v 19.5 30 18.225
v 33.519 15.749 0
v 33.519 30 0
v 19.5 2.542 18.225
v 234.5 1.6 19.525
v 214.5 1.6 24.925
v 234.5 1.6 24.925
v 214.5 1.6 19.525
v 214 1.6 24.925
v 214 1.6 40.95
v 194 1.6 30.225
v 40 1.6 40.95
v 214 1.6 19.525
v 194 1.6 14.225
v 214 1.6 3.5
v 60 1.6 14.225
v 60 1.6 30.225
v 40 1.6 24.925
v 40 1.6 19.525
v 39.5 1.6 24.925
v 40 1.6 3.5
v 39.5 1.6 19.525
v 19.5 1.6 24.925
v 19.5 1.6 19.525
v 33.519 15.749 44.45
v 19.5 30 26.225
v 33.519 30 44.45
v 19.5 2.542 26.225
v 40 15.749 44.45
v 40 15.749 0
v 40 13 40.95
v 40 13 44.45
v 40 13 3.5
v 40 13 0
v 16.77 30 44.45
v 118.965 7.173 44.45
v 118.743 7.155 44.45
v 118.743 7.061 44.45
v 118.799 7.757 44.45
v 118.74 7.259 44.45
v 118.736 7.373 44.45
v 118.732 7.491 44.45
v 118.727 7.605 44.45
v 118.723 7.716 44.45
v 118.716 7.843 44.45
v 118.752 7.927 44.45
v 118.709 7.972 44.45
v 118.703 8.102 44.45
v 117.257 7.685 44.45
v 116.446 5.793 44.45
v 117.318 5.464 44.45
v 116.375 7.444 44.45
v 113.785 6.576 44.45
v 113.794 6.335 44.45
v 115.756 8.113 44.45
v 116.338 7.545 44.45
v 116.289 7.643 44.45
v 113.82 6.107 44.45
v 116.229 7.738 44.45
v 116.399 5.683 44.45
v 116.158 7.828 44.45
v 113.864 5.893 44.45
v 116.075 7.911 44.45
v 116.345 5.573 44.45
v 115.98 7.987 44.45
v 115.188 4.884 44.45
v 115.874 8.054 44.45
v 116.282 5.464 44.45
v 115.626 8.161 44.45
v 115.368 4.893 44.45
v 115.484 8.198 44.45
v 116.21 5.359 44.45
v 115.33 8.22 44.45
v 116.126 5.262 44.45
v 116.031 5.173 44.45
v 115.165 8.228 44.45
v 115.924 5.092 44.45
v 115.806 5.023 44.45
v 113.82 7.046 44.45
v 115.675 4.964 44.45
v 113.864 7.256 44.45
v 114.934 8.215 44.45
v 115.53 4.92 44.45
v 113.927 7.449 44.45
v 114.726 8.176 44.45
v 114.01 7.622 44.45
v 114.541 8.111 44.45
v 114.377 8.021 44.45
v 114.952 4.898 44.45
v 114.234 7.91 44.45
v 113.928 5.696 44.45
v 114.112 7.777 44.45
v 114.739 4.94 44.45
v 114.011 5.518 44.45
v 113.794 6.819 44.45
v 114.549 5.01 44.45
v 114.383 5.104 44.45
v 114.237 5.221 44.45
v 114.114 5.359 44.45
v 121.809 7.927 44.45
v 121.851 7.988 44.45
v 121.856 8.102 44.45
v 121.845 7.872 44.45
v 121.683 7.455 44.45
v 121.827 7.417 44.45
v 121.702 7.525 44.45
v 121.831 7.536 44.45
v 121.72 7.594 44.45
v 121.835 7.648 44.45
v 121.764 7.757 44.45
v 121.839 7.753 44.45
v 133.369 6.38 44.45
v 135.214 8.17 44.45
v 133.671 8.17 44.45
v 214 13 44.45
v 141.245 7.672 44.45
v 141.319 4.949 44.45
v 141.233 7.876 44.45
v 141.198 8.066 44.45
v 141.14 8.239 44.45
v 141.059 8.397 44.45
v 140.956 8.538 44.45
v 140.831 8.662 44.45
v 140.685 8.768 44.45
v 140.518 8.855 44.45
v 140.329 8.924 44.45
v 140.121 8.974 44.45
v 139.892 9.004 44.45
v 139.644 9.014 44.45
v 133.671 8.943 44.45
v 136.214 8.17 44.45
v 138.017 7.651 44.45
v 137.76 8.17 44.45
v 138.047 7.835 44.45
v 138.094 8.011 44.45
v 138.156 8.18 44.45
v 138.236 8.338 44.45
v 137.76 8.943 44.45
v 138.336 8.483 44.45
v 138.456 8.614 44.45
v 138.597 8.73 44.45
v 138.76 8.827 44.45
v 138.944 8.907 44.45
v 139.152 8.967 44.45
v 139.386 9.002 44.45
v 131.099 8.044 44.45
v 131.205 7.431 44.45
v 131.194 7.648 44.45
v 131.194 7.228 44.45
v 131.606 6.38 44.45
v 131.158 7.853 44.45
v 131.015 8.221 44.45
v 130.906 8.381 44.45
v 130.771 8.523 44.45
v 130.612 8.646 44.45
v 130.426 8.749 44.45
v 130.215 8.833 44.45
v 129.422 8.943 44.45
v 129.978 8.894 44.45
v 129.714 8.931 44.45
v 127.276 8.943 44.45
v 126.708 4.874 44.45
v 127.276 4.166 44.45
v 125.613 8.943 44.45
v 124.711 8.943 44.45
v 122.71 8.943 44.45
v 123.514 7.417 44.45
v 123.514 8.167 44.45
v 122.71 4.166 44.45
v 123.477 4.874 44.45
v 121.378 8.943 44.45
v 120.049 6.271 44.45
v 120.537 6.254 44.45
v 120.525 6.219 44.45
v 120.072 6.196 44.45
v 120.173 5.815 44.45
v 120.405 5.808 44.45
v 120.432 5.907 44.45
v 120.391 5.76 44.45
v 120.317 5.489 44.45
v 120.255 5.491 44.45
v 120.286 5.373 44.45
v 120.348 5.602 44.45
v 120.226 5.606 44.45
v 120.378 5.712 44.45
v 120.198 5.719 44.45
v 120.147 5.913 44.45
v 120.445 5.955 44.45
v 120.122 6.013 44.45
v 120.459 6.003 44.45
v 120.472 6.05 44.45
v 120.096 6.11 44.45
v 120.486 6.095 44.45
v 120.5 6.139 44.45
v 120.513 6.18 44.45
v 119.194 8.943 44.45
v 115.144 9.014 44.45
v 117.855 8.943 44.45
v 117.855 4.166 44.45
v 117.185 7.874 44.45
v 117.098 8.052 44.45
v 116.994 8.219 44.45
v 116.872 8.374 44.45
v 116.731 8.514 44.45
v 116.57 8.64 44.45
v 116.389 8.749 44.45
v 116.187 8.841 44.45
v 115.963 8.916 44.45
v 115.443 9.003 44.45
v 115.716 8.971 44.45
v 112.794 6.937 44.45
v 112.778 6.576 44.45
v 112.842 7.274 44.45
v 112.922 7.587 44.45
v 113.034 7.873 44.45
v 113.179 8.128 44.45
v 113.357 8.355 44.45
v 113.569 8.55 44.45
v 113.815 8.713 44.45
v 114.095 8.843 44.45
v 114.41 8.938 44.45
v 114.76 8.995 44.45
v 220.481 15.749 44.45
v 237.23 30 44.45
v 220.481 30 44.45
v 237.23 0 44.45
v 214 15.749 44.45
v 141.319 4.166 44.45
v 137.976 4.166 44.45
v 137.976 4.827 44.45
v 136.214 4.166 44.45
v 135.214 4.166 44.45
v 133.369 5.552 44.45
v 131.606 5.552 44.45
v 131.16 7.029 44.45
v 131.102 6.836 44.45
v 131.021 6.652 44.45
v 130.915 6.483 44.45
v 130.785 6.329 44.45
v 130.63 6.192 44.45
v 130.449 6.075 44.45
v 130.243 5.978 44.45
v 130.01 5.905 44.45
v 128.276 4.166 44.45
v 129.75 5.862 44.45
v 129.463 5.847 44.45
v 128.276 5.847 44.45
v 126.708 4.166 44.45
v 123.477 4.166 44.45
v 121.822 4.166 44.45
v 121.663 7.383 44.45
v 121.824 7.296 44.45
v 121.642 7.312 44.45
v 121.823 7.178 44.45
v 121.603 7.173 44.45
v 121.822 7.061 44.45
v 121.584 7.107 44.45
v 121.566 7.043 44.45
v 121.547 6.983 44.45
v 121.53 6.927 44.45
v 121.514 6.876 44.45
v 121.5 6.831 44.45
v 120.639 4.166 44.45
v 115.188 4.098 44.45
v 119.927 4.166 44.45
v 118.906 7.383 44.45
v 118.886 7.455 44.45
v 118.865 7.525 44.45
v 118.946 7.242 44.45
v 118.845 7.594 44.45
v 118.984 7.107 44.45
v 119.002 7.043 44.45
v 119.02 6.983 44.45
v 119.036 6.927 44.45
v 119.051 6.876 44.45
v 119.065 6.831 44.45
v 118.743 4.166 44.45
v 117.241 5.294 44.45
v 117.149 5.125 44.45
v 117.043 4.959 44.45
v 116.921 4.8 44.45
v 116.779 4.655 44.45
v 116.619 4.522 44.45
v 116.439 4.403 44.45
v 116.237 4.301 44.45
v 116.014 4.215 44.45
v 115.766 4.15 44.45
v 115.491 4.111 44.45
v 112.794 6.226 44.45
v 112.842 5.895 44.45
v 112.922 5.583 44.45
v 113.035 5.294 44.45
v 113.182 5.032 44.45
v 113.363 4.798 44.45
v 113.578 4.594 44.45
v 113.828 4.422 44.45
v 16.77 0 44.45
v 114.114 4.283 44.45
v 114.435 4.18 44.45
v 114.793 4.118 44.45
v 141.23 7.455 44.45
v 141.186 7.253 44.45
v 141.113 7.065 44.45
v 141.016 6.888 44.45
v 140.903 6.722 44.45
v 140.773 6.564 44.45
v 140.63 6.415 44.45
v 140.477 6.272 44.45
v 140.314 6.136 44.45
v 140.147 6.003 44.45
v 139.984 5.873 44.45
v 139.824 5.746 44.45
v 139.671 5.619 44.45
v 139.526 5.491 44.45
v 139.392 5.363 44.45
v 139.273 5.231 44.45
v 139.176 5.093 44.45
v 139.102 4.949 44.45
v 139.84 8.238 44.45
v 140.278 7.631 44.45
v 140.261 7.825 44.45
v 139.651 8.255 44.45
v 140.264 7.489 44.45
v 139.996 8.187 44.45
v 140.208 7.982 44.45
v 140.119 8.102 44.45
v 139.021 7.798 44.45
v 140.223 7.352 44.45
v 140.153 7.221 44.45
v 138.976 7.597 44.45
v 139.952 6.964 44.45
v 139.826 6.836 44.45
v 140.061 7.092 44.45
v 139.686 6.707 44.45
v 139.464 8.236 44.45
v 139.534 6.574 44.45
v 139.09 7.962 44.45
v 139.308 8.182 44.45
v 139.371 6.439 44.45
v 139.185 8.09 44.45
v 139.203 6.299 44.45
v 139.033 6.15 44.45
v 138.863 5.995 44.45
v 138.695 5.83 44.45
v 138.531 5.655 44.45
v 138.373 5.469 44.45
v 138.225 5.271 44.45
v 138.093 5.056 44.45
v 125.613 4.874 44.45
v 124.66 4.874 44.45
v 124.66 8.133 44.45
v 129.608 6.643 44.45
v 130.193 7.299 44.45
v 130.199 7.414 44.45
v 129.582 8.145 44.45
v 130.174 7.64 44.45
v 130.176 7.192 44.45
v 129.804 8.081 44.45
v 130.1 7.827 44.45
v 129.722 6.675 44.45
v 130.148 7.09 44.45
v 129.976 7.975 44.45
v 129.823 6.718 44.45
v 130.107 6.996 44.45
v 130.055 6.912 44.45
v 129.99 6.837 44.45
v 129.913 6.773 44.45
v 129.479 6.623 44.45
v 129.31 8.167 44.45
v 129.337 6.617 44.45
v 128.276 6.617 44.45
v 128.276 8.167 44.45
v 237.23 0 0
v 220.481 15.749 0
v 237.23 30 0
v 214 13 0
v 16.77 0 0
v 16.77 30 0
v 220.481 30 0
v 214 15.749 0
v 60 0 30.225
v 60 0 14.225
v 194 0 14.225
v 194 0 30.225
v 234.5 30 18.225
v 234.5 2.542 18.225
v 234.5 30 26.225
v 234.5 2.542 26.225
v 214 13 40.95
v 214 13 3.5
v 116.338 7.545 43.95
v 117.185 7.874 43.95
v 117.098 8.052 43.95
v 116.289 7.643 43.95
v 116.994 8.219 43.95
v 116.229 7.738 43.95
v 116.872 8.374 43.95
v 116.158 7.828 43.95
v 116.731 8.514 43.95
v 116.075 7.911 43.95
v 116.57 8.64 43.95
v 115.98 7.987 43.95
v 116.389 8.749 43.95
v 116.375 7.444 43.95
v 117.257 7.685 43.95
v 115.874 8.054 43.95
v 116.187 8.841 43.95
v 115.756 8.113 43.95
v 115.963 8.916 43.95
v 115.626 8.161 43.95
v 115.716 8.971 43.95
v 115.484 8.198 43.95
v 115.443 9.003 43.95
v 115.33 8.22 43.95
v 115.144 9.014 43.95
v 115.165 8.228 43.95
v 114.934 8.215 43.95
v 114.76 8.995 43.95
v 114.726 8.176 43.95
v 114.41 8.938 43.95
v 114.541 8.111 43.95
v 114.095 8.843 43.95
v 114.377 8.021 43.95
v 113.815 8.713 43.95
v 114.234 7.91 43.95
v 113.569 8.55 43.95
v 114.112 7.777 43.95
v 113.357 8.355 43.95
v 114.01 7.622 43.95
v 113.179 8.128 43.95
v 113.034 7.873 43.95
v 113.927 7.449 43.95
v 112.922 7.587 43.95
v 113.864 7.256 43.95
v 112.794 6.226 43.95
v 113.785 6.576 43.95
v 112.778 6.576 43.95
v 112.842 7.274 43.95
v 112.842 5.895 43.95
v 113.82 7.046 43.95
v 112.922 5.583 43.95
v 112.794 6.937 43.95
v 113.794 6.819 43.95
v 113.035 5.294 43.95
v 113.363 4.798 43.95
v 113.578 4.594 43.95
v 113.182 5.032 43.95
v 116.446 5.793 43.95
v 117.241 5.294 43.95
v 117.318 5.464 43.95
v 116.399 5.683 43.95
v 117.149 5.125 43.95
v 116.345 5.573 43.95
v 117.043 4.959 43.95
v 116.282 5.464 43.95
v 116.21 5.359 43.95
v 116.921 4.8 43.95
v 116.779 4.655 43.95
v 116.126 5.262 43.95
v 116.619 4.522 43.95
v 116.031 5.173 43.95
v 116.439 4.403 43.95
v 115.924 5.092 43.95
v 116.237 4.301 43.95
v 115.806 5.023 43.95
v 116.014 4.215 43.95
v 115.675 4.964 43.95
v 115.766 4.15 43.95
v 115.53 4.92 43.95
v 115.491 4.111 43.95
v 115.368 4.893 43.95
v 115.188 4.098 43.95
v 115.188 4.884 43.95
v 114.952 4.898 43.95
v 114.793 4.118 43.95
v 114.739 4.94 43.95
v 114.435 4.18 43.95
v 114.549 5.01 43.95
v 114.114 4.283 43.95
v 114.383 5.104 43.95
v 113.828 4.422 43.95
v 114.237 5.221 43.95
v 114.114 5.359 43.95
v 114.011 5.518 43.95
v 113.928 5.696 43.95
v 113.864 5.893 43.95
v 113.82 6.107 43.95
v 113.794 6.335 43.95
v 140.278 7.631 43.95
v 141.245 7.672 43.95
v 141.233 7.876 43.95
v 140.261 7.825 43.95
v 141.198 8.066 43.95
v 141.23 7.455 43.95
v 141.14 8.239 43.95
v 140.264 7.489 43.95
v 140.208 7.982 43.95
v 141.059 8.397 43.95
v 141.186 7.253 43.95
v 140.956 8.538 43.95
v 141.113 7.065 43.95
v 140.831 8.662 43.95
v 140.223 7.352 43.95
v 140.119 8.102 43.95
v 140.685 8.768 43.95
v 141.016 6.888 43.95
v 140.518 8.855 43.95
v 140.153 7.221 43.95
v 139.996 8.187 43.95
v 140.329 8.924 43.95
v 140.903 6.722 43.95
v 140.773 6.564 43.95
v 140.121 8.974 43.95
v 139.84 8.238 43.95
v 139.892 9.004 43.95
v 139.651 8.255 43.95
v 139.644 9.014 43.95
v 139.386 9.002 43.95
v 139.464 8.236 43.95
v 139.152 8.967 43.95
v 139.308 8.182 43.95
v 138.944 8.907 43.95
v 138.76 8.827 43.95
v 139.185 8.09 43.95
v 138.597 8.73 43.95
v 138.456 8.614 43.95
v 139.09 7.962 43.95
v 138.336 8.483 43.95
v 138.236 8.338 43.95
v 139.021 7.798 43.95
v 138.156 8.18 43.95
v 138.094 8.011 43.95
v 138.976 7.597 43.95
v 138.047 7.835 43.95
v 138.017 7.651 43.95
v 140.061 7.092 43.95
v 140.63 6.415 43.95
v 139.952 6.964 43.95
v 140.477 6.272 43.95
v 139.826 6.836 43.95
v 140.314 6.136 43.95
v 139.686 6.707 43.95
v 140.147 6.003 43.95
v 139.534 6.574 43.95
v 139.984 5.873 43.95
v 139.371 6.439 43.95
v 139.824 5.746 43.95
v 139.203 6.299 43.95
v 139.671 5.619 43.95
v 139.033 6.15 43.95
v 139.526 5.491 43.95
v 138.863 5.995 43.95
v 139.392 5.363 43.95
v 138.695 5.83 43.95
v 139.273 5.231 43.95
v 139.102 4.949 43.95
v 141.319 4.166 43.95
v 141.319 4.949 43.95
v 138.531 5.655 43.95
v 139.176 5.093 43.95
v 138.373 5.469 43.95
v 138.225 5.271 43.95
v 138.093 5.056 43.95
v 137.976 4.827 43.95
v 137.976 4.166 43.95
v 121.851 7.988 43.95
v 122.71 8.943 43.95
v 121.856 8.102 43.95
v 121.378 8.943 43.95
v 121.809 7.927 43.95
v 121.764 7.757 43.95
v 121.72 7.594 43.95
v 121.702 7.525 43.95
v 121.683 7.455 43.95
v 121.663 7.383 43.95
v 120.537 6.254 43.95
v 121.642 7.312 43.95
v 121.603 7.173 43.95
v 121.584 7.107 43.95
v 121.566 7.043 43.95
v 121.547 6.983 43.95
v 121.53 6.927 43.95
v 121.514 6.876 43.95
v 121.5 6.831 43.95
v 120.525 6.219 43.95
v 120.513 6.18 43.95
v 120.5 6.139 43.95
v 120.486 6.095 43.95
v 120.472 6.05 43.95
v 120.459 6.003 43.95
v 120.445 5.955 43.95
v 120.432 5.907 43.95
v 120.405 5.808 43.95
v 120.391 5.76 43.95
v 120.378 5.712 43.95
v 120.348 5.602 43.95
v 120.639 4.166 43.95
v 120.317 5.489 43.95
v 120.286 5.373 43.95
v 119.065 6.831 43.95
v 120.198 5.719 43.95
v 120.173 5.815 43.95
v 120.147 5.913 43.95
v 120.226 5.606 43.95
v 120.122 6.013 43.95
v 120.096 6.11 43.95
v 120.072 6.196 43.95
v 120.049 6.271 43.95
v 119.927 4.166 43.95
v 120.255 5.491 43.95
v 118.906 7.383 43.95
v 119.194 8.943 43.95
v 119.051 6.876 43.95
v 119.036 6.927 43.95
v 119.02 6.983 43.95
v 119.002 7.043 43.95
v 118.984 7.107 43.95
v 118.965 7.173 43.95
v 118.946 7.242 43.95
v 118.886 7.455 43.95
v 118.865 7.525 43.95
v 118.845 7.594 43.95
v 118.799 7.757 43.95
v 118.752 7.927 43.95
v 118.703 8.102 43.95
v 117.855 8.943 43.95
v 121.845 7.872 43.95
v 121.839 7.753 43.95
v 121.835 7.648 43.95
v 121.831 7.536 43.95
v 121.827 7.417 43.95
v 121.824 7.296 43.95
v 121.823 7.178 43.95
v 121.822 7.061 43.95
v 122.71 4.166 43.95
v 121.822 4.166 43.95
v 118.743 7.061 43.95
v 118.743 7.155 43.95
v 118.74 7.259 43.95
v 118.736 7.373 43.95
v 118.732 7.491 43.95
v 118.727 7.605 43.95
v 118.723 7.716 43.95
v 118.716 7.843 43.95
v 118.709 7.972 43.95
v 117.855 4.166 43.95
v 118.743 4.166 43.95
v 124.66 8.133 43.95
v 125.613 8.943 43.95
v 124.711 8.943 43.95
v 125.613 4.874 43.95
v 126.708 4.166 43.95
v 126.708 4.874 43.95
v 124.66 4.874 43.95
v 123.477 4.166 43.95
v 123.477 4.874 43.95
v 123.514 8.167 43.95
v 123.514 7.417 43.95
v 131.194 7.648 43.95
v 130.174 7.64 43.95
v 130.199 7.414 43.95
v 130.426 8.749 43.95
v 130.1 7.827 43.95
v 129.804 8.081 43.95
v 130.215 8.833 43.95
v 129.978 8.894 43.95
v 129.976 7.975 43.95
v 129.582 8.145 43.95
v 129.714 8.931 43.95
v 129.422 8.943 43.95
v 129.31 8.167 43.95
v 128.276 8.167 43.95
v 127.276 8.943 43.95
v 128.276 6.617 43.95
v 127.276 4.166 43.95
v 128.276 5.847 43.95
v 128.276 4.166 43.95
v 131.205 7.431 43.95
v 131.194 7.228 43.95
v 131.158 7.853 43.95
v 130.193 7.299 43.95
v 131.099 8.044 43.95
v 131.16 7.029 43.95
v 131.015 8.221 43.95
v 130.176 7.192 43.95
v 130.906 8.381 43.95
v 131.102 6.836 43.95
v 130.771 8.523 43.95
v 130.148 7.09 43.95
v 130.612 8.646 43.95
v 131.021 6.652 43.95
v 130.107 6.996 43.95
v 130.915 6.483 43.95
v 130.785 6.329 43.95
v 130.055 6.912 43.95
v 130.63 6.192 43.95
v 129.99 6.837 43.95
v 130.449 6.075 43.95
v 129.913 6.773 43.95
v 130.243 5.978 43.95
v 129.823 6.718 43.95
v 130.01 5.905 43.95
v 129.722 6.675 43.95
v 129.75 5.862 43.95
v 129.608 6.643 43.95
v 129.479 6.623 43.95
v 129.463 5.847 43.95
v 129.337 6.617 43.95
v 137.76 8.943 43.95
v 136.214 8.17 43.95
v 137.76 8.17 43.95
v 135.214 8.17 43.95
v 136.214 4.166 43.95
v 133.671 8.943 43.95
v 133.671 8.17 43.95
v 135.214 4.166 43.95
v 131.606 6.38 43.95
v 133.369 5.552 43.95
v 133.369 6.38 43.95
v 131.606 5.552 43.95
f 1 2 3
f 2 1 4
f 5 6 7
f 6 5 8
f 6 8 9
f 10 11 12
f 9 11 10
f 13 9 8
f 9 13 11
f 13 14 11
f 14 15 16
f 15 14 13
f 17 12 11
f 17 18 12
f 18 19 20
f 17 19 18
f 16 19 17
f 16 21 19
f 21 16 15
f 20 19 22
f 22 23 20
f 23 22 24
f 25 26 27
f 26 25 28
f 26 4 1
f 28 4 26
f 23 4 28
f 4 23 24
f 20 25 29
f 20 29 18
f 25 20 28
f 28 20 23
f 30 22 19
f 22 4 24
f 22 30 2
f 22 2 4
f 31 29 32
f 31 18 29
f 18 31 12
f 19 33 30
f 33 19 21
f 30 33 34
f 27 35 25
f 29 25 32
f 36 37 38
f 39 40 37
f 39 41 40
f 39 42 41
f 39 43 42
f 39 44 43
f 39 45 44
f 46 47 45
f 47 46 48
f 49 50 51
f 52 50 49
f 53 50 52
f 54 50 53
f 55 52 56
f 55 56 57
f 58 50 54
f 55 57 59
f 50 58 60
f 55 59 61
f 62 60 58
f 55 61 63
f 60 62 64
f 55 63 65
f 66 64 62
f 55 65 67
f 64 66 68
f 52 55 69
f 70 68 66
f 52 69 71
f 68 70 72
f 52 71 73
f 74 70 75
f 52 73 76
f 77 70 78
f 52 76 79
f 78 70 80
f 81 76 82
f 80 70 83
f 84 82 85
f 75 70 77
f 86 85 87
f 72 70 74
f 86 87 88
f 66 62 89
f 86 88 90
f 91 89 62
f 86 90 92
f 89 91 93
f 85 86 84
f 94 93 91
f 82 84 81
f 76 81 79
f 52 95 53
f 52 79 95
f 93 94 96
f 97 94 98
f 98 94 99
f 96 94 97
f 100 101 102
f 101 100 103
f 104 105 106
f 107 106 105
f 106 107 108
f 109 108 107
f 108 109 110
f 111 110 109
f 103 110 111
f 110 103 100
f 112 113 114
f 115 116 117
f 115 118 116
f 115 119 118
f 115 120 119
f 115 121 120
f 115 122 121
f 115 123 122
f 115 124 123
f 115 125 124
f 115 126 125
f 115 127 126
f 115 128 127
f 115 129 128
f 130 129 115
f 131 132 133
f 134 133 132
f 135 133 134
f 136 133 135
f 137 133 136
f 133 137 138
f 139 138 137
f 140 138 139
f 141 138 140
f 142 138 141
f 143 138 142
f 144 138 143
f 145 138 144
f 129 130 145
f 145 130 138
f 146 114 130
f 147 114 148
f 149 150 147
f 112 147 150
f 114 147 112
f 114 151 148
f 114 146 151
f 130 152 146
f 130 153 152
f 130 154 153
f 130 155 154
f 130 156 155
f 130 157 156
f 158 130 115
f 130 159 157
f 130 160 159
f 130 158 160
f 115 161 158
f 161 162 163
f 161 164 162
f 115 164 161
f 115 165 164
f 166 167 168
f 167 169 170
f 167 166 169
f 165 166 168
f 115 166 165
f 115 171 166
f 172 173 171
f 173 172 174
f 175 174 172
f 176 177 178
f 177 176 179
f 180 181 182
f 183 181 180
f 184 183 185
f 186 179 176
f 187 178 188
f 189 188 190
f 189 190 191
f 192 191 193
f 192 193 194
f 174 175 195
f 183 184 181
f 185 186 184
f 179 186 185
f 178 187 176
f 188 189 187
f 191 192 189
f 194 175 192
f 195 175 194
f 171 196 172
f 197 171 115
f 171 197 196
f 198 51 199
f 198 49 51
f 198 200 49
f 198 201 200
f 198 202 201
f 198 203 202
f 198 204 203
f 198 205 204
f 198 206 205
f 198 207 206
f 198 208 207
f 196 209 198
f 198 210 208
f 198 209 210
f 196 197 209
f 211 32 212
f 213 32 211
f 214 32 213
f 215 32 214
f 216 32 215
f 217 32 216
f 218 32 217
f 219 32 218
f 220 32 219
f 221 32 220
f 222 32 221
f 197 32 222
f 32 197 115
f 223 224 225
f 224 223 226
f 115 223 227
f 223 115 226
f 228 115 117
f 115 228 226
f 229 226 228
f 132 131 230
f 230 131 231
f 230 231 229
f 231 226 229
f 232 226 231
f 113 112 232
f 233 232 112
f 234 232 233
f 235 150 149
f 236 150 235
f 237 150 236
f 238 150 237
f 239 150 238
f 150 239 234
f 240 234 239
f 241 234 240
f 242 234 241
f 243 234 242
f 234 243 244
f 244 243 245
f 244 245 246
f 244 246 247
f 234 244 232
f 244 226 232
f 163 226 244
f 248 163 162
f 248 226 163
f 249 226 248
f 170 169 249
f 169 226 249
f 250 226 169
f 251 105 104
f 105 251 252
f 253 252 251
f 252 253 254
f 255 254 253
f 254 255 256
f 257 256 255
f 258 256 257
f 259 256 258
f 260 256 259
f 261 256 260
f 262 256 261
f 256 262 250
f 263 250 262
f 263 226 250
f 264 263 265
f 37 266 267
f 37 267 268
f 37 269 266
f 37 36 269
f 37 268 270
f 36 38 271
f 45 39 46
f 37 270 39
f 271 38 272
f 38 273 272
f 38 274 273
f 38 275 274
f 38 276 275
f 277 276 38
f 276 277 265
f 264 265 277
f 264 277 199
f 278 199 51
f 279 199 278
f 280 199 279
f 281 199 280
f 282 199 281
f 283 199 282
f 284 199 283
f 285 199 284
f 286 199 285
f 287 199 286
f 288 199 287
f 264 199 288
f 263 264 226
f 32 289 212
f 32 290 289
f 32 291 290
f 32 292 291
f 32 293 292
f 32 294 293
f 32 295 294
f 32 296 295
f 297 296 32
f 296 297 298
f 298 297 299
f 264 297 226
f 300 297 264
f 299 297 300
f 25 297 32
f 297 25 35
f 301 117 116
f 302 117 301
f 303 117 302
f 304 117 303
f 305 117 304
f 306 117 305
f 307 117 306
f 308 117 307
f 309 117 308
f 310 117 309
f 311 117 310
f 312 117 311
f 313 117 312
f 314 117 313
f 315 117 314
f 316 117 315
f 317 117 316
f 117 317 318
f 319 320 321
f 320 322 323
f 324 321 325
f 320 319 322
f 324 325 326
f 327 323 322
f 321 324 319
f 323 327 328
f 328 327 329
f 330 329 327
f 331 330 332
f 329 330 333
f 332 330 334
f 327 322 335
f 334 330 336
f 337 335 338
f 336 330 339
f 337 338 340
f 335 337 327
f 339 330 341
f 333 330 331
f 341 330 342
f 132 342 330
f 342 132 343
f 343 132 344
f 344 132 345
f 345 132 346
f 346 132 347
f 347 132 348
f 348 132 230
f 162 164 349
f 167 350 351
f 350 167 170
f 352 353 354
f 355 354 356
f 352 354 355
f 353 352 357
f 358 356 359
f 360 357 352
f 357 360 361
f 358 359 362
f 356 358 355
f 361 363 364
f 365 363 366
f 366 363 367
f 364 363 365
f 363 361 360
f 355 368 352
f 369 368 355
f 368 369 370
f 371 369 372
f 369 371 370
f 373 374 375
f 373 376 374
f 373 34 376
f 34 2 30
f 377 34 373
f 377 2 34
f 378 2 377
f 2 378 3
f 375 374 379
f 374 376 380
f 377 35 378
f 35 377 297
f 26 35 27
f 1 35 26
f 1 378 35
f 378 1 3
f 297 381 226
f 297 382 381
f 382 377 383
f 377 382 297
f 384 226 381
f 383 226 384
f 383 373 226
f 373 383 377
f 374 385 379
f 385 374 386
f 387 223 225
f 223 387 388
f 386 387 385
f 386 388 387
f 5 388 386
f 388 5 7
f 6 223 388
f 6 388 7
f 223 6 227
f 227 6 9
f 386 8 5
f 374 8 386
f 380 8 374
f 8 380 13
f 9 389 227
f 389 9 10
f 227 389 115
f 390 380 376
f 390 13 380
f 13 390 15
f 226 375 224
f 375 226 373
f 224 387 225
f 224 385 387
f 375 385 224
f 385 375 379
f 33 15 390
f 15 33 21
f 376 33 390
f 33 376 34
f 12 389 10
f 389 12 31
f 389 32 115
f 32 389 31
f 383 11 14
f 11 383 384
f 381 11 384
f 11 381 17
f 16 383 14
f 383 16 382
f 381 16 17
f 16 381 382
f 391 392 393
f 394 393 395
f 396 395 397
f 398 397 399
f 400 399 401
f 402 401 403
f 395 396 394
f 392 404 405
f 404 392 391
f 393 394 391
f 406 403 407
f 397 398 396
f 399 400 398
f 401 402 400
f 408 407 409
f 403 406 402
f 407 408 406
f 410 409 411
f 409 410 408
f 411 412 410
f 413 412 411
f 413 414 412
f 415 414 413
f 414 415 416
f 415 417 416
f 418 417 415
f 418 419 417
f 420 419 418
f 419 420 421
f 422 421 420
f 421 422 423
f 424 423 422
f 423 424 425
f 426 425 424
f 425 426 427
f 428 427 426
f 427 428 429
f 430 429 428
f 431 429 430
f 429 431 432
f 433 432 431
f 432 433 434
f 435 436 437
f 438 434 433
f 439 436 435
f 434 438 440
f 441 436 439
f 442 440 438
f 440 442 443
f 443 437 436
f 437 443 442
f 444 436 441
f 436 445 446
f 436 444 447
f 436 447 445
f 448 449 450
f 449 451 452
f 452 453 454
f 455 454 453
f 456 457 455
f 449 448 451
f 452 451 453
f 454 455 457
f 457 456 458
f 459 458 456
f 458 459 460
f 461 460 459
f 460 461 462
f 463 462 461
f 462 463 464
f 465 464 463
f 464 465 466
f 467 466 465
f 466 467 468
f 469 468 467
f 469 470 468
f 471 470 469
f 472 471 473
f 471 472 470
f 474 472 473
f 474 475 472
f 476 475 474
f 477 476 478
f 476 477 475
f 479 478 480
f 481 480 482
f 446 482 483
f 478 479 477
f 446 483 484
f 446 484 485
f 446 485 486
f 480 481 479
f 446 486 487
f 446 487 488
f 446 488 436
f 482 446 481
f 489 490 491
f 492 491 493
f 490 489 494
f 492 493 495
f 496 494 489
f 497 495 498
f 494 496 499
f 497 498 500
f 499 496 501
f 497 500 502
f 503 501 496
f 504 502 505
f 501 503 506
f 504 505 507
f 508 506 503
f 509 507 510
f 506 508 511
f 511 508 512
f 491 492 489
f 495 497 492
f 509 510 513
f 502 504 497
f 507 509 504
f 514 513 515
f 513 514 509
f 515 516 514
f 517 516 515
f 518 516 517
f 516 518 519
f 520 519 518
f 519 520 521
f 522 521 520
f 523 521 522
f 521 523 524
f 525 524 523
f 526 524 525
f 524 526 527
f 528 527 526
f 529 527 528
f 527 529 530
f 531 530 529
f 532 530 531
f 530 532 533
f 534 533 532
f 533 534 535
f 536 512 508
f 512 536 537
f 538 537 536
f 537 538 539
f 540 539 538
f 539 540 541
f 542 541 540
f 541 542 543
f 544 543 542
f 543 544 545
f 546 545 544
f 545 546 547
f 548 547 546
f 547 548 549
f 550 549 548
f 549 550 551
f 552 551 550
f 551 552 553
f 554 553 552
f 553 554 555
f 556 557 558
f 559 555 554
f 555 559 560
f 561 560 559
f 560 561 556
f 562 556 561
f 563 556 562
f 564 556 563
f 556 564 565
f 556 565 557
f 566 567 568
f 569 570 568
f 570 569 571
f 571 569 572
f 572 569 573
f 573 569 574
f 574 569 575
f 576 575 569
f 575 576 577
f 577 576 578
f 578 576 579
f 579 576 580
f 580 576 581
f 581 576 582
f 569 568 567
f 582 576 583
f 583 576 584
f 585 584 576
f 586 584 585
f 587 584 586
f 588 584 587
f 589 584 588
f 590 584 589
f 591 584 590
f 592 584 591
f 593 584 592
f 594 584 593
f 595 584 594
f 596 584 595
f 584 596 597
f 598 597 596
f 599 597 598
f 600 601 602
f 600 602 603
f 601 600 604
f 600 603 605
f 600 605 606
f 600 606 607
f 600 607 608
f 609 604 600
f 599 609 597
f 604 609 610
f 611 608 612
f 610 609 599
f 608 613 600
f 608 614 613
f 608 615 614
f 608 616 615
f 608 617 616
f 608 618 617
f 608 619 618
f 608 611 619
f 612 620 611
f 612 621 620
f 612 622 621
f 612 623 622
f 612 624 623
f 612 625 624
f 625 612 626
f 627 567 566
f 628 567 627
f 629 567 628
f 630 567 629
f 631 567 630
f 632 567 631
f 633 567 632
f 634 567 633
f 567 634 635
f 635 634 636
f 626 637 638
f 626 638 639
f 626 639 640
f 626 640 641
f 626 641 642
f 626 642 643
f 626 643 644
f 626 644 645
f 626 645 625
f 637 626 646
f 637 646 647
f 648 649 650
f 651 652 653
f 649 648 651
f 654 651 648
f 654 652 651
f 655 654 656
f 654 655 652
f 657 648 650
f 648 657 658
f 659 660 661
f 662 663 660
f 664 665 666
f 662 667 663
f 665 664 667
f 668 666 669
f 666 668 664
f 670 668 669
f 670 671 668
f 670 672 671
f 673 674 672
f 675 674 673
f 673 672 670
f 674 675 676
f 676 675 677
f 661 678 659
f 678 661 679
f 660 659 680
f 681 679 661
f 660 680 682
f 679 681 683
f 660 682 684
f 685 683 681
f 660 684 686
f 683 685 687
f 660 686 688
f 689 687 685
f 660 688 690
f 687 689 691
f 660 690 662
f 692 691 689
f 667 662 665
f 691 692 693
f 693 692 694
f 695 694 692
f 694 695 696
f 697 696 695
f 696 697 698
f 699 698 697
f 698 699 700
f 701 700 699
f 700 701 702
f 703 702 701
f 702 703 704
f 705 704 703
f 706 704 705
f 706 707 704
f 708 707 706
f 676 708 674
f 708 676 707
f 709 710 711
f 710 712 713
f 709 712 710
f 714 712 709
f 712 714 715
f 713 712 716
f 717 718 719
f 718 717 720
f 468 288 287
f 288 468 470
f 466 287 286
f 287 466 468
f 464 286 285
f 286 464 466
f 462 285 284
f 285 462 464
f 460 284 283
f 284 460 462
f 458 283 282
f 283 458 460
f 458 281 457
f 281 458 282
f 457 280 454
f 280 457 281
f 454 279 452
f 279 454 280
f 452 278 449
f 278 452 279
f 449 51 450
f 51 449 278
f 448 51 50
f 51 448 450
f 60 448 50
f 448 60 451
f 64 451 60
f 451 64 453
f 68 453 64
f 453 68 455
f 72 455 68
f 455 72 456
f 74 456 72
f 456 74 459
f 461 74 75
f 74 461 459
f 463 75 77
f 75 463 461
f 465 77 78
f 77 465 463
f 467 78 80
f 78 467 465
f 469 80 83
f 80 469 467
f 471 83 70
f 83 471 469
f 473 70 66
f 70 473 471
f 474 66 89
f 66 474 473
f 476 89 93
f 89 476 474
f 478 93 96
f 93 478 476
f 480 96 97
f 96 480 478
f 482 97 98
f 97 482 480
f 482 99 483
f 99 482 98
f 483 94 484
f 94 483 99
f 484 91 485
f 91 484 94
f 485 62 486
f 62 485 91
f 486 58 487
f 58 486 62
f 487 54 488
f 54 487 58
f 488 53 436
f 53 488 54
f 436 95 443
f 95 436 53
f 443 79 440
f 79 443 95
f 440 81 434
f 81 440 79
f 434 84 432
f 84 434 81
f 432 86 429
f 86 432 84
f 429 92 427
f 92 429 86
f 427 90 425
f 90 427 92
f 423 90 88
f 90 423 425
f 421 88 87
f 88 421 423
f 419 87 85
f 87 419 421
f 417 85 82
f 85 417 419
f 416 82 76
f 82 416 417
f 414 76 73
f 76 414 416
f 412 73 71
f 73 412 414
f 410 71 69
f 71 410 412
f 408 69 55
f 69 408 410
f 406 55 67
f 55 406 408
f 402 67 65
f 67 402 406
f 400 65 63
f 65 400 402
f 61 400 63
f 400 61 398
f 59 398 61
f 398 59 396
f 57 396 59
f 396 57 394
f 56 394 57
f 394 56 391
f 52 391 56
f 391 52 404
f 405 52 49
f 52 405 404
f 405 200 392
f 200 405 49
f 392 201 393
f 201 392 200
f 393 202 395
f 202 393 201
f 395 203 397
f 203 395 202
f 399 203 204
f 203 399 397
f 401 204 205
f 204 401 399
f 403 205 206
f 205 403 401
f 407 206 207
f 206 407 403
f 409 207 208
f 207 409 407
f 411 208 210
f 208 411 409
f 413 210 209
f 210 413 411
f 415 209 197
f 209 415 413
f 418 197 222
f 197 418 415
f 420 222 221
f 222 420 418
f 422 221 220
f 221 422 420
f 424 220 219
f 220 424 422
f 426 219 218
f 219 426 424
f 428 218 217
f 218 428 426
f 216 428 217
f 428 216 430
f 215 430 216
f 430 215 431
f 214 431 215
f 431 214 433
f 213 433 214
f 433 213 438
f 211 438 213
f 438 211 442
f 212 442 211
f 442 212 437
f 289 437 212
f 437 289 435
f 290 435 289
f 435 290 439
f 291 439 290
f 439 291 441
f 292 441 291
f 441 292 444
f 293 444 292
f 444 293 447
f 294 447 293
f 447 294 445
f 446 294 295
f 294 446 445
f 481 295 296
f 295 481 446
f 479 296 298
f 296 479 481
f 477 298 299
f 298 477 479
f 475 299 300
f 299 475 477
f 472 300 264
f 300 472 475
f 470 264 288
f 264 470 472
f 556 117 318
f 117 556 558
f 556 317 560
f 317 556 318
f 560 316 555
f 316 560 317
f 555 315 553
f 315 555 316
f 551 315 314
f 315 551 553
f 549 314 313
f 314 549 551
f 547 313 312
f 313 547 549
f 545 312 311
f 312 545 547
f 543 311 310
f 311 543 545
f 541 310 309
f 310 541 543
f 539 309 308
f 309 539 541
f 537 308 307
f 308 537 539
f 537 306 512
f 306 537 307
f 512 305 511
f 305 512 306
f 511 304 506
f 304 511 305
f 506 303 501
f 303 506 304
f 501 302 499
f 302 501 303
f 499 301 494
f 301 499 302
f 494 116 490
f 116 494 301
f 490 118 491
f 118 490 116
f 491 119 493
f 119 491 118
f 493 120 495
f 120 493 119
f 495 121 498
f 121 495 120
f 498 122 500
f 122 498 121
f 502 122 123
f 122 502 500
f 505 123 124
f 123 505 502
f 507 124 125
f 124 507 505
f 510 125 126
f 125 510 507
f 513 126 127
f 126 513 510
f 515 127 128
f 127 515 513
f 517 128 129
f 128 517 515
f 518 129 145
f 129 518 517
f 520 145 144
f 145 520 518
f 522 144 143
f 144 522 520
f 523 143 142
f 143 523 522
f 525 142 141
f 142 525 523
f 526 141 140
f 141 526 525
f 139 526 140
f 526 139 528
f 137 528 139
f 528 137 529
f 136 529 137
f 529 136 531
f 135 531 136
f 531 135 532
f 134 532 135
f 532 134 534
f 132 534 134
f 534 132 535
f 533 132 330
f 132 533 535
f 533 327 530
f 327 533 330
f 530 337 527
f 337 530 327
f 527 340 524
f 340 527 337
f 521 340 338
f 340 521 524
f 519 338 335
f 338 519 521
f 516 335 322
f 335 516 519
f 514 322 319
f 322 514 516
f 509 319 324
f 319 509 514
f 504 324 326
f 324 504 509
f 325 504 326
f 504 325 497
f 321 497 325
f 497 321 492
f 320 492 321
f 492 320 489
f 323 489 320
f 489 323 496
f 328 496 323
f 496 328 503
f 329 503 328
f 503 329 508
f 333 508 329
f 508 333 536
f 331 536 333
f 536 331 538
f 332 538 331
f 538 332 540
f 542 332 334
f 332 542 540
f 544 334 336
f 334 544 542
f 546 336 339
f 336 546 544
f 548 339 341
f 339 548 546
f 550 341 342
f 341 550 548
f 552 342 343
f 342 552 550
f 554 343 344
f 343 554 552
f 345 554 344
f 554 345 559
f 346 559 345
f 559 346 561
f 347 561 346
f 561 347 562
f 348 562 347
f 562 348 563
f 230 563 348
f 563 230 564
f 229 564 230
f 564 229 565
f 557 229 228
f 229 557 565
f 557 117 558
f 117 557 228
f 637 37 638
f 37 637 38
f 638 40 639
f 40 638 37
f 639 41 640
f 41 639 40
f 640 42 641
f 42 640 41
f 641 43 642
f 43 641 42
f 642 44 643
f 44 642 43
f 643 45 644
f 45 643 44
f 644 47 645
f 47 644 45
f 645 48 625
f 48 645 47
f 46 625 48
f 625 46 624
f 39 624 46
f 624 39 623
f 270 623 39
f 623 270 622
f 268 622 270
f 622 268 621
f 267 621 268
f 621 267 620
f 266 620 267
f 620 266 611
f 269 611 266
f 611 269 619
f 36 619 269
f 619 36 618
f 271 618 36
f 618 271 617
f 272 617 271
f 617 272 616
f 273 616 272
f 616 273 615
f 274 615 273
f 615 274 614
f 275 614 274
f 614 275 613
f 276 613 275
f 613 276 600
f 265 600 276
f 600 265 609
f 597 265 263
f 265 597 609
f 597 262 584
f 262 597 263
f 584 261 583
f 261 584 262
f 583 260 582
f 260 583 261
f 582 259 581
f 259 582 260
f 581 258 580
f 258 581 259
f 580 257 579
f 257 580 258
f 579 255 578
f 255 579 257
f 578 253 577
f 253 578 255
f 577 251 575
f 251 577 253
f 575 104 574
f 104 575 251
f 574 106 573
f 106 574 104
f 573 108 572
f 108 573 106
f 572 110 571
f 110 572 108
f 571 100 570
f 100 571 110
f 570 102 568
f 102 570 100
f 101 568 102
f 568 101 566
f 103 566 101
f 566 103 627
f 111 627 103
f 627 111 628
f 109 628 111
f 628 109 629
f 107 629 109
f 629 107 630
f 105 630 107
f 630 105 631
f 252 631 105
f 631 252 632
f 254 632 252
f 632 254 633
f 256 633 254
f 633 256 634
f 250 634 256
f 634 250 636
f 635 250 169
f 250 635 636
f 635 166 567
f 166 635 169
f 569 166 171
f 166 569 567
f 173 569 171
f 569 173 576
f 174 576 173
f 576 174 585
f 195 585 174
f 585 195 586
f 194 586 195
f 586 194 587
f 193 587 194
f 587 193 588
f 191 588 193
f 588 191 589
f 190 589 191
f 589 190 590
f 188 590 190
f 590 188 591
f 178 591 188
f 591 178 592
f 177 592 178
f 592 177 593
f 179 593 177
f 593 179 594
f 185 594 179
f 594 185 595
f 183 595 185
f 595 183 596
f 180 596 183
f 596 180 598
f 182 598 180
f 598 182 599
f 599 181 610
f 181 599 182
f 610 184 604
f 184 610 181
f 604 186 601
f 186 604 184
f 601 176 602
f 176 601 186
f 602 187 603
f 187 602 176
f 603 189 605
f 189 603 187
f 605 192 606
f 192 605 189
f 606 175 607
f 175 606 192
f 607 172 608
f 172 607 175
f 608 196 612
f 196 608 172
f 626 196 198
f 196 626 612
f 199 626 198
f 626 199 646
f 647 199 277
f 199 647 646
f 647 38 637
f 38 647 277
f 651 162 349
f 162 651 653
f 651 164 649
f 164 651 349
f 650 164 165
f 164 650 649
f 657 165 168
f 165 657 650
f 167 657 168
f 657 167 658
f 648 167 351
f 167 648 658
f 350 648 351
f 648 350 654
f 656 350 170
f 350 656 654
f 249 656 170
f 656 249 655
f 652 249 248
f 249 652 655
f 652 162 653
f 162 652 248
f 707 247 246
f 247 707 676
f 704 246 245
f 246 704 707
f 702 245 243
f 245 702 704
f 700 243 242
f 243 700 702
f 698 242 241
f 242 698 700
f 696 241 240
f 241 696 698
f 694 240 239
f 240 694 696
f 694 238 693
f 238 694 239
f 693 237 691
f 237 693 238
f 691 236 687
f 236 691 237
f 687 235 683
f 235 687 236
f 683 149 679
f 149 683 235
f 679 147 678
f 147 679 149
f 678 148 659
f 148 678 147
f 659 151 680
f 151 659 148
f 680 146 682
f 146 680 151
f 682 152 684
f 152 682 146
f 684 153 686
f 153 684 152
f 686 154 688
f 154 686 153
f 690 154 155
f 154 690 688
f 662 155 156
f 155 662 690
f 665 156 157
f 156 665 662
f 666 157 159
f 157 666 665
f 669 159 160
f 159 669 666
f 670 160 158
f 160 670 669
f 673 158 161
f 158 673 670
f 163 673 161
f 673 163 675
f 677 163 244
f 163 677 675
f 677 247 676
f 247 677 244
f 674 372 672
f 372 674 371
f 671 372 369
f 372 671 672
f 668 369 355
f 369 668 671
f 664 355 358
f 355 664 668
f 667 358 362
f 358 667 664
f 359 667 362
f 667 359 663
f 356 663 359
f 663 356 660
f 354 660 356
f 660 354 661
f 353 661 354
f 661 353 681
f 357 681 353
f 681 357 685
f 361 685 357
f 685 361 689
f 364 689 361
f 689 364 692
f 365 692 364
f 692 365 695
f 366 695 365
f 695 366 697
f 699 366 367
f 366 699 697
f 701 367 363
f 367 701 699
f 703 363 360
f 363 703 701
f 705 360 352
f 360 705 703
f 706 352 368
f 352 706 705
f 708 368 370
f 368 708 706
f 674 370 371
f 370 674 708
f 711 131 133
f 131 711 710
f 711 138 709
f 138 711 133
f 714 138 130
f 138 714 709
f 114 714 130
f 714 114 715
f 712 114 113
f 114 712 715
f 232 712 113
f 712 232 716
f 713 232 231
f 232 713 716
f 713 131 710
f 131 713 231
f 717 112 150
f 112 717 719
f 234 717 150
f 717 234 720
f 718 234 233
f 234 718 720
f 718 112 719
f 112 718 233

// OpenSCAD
// CM1P-T2: second test slice for the one-piece CM1000 bracket. T1 was too tight and its thin strips bowed as the blocks levered apart.
// Changes from T1: flat channel floor for the modem's flat end strip, 1.5 clearance across the width (was 0.4),
// 1.2 on the nose (was 0.7), a 1.6 front wall across the whole width so the frame can't bow, like the real faceplate.
// Brian measured: 212 across the flat ends, 44.4 tall, 14 end wedge, 3 tall at the very front, 44.4 at 15 back.
// ASSUMED: nose a straight taper; flat strip width unmeasured.
// Frame: X across (254 plate), Y depth (plate front Y=0), Z height (0..44.45).
id = "CM1P-T2";

plate_h = 44.45;
mid = plate_h / 2;
rail_x = 16.77;            // outer face of the rails, unchanged: 220.46 across
block_x = 40;
depth = 30;

gap_x = 1.5;               // clearance across the width: deliberately loose, T1 had to be REALLY forced on; measure the play and dial in
flat_w = 8;                // channel floor; modem's flat end strip looks narrower (by eye), extra is safe
tip_x = 127 - 212 / 2 - gap_x;
slope = 14 / (22.2 - flat_w / 2);
over = 23.5;

nose_k = (22.2 - 1.5) / 15;
floor_y = 1.6;             // front wall
floor_h = 2.7;             // modem front face half height 1.5 + 1.2 clearance
far_y = 20;

strip_h = 3.5;
strip_y = 13;
window = [134, 16];        // in the front wall: see the modem's front; X, Z size

module channel(y0, y1)
    translate([0, y1, 0]) rotate([90, 0, 0]) linear_extrude(y1 - y0)
        polygon([[tip_x, mid - flat_w / 2], [tip_x, mid + flat_w / 2],
                 [tip_x + slope * (over - flat_w / 2), mid + over], [block_x + 5, mid + over],
                 [block_x + 5, mid - over], [tip_x + slope * (over - flat_w / 2), mid - over]]);
module pocket_cut() intersection() {
    channel(floor_y, depth + 1);
    h = floor_h + nose_k * (far_y - floor_y);
    rotate([90, 0, 90]) linear_extrude(block_x + 6)
        polygon([[floor_y, mid - floor_h], [floor_y, mid + floor_h], [far_y, mid + h], [depth + 2, mid + h], [depth + 2, mid - h], [far_y, mid - h]]);
}
module end_block() difference() {
    translate([rail_x, 0, 0]) cube([block_x - rail_x, depth, plate_h]);
    pocket_cut();
}
module strip(z) translate([rail_x, 0, z]) cube([254 - 2 * rail_x, strip_y, strip_h]);

difference() {
    union() {
        end_block();
        translate([254, 0, 0]) mirror([1, 0, 0]) end_block();
        strip(0);
        strip(plate_h - strip_h);
        translate([block_x - 0.5, 0, 0]) cube([254 - 2 * block_x + 1, floor_y, plate_h]);
    }
    translate([127 - window[0] / 2, -1, mid - window[1] / 2]) cube([window[0], floor_y + 2, window[1]]);
    translate([127, strip_y / 2, plate_h - 0.5]) linear_extrude(1)
        text(id, size = 5, font = "Liberation Sans:style=Bold", halign = "center", valign = "center");
}
